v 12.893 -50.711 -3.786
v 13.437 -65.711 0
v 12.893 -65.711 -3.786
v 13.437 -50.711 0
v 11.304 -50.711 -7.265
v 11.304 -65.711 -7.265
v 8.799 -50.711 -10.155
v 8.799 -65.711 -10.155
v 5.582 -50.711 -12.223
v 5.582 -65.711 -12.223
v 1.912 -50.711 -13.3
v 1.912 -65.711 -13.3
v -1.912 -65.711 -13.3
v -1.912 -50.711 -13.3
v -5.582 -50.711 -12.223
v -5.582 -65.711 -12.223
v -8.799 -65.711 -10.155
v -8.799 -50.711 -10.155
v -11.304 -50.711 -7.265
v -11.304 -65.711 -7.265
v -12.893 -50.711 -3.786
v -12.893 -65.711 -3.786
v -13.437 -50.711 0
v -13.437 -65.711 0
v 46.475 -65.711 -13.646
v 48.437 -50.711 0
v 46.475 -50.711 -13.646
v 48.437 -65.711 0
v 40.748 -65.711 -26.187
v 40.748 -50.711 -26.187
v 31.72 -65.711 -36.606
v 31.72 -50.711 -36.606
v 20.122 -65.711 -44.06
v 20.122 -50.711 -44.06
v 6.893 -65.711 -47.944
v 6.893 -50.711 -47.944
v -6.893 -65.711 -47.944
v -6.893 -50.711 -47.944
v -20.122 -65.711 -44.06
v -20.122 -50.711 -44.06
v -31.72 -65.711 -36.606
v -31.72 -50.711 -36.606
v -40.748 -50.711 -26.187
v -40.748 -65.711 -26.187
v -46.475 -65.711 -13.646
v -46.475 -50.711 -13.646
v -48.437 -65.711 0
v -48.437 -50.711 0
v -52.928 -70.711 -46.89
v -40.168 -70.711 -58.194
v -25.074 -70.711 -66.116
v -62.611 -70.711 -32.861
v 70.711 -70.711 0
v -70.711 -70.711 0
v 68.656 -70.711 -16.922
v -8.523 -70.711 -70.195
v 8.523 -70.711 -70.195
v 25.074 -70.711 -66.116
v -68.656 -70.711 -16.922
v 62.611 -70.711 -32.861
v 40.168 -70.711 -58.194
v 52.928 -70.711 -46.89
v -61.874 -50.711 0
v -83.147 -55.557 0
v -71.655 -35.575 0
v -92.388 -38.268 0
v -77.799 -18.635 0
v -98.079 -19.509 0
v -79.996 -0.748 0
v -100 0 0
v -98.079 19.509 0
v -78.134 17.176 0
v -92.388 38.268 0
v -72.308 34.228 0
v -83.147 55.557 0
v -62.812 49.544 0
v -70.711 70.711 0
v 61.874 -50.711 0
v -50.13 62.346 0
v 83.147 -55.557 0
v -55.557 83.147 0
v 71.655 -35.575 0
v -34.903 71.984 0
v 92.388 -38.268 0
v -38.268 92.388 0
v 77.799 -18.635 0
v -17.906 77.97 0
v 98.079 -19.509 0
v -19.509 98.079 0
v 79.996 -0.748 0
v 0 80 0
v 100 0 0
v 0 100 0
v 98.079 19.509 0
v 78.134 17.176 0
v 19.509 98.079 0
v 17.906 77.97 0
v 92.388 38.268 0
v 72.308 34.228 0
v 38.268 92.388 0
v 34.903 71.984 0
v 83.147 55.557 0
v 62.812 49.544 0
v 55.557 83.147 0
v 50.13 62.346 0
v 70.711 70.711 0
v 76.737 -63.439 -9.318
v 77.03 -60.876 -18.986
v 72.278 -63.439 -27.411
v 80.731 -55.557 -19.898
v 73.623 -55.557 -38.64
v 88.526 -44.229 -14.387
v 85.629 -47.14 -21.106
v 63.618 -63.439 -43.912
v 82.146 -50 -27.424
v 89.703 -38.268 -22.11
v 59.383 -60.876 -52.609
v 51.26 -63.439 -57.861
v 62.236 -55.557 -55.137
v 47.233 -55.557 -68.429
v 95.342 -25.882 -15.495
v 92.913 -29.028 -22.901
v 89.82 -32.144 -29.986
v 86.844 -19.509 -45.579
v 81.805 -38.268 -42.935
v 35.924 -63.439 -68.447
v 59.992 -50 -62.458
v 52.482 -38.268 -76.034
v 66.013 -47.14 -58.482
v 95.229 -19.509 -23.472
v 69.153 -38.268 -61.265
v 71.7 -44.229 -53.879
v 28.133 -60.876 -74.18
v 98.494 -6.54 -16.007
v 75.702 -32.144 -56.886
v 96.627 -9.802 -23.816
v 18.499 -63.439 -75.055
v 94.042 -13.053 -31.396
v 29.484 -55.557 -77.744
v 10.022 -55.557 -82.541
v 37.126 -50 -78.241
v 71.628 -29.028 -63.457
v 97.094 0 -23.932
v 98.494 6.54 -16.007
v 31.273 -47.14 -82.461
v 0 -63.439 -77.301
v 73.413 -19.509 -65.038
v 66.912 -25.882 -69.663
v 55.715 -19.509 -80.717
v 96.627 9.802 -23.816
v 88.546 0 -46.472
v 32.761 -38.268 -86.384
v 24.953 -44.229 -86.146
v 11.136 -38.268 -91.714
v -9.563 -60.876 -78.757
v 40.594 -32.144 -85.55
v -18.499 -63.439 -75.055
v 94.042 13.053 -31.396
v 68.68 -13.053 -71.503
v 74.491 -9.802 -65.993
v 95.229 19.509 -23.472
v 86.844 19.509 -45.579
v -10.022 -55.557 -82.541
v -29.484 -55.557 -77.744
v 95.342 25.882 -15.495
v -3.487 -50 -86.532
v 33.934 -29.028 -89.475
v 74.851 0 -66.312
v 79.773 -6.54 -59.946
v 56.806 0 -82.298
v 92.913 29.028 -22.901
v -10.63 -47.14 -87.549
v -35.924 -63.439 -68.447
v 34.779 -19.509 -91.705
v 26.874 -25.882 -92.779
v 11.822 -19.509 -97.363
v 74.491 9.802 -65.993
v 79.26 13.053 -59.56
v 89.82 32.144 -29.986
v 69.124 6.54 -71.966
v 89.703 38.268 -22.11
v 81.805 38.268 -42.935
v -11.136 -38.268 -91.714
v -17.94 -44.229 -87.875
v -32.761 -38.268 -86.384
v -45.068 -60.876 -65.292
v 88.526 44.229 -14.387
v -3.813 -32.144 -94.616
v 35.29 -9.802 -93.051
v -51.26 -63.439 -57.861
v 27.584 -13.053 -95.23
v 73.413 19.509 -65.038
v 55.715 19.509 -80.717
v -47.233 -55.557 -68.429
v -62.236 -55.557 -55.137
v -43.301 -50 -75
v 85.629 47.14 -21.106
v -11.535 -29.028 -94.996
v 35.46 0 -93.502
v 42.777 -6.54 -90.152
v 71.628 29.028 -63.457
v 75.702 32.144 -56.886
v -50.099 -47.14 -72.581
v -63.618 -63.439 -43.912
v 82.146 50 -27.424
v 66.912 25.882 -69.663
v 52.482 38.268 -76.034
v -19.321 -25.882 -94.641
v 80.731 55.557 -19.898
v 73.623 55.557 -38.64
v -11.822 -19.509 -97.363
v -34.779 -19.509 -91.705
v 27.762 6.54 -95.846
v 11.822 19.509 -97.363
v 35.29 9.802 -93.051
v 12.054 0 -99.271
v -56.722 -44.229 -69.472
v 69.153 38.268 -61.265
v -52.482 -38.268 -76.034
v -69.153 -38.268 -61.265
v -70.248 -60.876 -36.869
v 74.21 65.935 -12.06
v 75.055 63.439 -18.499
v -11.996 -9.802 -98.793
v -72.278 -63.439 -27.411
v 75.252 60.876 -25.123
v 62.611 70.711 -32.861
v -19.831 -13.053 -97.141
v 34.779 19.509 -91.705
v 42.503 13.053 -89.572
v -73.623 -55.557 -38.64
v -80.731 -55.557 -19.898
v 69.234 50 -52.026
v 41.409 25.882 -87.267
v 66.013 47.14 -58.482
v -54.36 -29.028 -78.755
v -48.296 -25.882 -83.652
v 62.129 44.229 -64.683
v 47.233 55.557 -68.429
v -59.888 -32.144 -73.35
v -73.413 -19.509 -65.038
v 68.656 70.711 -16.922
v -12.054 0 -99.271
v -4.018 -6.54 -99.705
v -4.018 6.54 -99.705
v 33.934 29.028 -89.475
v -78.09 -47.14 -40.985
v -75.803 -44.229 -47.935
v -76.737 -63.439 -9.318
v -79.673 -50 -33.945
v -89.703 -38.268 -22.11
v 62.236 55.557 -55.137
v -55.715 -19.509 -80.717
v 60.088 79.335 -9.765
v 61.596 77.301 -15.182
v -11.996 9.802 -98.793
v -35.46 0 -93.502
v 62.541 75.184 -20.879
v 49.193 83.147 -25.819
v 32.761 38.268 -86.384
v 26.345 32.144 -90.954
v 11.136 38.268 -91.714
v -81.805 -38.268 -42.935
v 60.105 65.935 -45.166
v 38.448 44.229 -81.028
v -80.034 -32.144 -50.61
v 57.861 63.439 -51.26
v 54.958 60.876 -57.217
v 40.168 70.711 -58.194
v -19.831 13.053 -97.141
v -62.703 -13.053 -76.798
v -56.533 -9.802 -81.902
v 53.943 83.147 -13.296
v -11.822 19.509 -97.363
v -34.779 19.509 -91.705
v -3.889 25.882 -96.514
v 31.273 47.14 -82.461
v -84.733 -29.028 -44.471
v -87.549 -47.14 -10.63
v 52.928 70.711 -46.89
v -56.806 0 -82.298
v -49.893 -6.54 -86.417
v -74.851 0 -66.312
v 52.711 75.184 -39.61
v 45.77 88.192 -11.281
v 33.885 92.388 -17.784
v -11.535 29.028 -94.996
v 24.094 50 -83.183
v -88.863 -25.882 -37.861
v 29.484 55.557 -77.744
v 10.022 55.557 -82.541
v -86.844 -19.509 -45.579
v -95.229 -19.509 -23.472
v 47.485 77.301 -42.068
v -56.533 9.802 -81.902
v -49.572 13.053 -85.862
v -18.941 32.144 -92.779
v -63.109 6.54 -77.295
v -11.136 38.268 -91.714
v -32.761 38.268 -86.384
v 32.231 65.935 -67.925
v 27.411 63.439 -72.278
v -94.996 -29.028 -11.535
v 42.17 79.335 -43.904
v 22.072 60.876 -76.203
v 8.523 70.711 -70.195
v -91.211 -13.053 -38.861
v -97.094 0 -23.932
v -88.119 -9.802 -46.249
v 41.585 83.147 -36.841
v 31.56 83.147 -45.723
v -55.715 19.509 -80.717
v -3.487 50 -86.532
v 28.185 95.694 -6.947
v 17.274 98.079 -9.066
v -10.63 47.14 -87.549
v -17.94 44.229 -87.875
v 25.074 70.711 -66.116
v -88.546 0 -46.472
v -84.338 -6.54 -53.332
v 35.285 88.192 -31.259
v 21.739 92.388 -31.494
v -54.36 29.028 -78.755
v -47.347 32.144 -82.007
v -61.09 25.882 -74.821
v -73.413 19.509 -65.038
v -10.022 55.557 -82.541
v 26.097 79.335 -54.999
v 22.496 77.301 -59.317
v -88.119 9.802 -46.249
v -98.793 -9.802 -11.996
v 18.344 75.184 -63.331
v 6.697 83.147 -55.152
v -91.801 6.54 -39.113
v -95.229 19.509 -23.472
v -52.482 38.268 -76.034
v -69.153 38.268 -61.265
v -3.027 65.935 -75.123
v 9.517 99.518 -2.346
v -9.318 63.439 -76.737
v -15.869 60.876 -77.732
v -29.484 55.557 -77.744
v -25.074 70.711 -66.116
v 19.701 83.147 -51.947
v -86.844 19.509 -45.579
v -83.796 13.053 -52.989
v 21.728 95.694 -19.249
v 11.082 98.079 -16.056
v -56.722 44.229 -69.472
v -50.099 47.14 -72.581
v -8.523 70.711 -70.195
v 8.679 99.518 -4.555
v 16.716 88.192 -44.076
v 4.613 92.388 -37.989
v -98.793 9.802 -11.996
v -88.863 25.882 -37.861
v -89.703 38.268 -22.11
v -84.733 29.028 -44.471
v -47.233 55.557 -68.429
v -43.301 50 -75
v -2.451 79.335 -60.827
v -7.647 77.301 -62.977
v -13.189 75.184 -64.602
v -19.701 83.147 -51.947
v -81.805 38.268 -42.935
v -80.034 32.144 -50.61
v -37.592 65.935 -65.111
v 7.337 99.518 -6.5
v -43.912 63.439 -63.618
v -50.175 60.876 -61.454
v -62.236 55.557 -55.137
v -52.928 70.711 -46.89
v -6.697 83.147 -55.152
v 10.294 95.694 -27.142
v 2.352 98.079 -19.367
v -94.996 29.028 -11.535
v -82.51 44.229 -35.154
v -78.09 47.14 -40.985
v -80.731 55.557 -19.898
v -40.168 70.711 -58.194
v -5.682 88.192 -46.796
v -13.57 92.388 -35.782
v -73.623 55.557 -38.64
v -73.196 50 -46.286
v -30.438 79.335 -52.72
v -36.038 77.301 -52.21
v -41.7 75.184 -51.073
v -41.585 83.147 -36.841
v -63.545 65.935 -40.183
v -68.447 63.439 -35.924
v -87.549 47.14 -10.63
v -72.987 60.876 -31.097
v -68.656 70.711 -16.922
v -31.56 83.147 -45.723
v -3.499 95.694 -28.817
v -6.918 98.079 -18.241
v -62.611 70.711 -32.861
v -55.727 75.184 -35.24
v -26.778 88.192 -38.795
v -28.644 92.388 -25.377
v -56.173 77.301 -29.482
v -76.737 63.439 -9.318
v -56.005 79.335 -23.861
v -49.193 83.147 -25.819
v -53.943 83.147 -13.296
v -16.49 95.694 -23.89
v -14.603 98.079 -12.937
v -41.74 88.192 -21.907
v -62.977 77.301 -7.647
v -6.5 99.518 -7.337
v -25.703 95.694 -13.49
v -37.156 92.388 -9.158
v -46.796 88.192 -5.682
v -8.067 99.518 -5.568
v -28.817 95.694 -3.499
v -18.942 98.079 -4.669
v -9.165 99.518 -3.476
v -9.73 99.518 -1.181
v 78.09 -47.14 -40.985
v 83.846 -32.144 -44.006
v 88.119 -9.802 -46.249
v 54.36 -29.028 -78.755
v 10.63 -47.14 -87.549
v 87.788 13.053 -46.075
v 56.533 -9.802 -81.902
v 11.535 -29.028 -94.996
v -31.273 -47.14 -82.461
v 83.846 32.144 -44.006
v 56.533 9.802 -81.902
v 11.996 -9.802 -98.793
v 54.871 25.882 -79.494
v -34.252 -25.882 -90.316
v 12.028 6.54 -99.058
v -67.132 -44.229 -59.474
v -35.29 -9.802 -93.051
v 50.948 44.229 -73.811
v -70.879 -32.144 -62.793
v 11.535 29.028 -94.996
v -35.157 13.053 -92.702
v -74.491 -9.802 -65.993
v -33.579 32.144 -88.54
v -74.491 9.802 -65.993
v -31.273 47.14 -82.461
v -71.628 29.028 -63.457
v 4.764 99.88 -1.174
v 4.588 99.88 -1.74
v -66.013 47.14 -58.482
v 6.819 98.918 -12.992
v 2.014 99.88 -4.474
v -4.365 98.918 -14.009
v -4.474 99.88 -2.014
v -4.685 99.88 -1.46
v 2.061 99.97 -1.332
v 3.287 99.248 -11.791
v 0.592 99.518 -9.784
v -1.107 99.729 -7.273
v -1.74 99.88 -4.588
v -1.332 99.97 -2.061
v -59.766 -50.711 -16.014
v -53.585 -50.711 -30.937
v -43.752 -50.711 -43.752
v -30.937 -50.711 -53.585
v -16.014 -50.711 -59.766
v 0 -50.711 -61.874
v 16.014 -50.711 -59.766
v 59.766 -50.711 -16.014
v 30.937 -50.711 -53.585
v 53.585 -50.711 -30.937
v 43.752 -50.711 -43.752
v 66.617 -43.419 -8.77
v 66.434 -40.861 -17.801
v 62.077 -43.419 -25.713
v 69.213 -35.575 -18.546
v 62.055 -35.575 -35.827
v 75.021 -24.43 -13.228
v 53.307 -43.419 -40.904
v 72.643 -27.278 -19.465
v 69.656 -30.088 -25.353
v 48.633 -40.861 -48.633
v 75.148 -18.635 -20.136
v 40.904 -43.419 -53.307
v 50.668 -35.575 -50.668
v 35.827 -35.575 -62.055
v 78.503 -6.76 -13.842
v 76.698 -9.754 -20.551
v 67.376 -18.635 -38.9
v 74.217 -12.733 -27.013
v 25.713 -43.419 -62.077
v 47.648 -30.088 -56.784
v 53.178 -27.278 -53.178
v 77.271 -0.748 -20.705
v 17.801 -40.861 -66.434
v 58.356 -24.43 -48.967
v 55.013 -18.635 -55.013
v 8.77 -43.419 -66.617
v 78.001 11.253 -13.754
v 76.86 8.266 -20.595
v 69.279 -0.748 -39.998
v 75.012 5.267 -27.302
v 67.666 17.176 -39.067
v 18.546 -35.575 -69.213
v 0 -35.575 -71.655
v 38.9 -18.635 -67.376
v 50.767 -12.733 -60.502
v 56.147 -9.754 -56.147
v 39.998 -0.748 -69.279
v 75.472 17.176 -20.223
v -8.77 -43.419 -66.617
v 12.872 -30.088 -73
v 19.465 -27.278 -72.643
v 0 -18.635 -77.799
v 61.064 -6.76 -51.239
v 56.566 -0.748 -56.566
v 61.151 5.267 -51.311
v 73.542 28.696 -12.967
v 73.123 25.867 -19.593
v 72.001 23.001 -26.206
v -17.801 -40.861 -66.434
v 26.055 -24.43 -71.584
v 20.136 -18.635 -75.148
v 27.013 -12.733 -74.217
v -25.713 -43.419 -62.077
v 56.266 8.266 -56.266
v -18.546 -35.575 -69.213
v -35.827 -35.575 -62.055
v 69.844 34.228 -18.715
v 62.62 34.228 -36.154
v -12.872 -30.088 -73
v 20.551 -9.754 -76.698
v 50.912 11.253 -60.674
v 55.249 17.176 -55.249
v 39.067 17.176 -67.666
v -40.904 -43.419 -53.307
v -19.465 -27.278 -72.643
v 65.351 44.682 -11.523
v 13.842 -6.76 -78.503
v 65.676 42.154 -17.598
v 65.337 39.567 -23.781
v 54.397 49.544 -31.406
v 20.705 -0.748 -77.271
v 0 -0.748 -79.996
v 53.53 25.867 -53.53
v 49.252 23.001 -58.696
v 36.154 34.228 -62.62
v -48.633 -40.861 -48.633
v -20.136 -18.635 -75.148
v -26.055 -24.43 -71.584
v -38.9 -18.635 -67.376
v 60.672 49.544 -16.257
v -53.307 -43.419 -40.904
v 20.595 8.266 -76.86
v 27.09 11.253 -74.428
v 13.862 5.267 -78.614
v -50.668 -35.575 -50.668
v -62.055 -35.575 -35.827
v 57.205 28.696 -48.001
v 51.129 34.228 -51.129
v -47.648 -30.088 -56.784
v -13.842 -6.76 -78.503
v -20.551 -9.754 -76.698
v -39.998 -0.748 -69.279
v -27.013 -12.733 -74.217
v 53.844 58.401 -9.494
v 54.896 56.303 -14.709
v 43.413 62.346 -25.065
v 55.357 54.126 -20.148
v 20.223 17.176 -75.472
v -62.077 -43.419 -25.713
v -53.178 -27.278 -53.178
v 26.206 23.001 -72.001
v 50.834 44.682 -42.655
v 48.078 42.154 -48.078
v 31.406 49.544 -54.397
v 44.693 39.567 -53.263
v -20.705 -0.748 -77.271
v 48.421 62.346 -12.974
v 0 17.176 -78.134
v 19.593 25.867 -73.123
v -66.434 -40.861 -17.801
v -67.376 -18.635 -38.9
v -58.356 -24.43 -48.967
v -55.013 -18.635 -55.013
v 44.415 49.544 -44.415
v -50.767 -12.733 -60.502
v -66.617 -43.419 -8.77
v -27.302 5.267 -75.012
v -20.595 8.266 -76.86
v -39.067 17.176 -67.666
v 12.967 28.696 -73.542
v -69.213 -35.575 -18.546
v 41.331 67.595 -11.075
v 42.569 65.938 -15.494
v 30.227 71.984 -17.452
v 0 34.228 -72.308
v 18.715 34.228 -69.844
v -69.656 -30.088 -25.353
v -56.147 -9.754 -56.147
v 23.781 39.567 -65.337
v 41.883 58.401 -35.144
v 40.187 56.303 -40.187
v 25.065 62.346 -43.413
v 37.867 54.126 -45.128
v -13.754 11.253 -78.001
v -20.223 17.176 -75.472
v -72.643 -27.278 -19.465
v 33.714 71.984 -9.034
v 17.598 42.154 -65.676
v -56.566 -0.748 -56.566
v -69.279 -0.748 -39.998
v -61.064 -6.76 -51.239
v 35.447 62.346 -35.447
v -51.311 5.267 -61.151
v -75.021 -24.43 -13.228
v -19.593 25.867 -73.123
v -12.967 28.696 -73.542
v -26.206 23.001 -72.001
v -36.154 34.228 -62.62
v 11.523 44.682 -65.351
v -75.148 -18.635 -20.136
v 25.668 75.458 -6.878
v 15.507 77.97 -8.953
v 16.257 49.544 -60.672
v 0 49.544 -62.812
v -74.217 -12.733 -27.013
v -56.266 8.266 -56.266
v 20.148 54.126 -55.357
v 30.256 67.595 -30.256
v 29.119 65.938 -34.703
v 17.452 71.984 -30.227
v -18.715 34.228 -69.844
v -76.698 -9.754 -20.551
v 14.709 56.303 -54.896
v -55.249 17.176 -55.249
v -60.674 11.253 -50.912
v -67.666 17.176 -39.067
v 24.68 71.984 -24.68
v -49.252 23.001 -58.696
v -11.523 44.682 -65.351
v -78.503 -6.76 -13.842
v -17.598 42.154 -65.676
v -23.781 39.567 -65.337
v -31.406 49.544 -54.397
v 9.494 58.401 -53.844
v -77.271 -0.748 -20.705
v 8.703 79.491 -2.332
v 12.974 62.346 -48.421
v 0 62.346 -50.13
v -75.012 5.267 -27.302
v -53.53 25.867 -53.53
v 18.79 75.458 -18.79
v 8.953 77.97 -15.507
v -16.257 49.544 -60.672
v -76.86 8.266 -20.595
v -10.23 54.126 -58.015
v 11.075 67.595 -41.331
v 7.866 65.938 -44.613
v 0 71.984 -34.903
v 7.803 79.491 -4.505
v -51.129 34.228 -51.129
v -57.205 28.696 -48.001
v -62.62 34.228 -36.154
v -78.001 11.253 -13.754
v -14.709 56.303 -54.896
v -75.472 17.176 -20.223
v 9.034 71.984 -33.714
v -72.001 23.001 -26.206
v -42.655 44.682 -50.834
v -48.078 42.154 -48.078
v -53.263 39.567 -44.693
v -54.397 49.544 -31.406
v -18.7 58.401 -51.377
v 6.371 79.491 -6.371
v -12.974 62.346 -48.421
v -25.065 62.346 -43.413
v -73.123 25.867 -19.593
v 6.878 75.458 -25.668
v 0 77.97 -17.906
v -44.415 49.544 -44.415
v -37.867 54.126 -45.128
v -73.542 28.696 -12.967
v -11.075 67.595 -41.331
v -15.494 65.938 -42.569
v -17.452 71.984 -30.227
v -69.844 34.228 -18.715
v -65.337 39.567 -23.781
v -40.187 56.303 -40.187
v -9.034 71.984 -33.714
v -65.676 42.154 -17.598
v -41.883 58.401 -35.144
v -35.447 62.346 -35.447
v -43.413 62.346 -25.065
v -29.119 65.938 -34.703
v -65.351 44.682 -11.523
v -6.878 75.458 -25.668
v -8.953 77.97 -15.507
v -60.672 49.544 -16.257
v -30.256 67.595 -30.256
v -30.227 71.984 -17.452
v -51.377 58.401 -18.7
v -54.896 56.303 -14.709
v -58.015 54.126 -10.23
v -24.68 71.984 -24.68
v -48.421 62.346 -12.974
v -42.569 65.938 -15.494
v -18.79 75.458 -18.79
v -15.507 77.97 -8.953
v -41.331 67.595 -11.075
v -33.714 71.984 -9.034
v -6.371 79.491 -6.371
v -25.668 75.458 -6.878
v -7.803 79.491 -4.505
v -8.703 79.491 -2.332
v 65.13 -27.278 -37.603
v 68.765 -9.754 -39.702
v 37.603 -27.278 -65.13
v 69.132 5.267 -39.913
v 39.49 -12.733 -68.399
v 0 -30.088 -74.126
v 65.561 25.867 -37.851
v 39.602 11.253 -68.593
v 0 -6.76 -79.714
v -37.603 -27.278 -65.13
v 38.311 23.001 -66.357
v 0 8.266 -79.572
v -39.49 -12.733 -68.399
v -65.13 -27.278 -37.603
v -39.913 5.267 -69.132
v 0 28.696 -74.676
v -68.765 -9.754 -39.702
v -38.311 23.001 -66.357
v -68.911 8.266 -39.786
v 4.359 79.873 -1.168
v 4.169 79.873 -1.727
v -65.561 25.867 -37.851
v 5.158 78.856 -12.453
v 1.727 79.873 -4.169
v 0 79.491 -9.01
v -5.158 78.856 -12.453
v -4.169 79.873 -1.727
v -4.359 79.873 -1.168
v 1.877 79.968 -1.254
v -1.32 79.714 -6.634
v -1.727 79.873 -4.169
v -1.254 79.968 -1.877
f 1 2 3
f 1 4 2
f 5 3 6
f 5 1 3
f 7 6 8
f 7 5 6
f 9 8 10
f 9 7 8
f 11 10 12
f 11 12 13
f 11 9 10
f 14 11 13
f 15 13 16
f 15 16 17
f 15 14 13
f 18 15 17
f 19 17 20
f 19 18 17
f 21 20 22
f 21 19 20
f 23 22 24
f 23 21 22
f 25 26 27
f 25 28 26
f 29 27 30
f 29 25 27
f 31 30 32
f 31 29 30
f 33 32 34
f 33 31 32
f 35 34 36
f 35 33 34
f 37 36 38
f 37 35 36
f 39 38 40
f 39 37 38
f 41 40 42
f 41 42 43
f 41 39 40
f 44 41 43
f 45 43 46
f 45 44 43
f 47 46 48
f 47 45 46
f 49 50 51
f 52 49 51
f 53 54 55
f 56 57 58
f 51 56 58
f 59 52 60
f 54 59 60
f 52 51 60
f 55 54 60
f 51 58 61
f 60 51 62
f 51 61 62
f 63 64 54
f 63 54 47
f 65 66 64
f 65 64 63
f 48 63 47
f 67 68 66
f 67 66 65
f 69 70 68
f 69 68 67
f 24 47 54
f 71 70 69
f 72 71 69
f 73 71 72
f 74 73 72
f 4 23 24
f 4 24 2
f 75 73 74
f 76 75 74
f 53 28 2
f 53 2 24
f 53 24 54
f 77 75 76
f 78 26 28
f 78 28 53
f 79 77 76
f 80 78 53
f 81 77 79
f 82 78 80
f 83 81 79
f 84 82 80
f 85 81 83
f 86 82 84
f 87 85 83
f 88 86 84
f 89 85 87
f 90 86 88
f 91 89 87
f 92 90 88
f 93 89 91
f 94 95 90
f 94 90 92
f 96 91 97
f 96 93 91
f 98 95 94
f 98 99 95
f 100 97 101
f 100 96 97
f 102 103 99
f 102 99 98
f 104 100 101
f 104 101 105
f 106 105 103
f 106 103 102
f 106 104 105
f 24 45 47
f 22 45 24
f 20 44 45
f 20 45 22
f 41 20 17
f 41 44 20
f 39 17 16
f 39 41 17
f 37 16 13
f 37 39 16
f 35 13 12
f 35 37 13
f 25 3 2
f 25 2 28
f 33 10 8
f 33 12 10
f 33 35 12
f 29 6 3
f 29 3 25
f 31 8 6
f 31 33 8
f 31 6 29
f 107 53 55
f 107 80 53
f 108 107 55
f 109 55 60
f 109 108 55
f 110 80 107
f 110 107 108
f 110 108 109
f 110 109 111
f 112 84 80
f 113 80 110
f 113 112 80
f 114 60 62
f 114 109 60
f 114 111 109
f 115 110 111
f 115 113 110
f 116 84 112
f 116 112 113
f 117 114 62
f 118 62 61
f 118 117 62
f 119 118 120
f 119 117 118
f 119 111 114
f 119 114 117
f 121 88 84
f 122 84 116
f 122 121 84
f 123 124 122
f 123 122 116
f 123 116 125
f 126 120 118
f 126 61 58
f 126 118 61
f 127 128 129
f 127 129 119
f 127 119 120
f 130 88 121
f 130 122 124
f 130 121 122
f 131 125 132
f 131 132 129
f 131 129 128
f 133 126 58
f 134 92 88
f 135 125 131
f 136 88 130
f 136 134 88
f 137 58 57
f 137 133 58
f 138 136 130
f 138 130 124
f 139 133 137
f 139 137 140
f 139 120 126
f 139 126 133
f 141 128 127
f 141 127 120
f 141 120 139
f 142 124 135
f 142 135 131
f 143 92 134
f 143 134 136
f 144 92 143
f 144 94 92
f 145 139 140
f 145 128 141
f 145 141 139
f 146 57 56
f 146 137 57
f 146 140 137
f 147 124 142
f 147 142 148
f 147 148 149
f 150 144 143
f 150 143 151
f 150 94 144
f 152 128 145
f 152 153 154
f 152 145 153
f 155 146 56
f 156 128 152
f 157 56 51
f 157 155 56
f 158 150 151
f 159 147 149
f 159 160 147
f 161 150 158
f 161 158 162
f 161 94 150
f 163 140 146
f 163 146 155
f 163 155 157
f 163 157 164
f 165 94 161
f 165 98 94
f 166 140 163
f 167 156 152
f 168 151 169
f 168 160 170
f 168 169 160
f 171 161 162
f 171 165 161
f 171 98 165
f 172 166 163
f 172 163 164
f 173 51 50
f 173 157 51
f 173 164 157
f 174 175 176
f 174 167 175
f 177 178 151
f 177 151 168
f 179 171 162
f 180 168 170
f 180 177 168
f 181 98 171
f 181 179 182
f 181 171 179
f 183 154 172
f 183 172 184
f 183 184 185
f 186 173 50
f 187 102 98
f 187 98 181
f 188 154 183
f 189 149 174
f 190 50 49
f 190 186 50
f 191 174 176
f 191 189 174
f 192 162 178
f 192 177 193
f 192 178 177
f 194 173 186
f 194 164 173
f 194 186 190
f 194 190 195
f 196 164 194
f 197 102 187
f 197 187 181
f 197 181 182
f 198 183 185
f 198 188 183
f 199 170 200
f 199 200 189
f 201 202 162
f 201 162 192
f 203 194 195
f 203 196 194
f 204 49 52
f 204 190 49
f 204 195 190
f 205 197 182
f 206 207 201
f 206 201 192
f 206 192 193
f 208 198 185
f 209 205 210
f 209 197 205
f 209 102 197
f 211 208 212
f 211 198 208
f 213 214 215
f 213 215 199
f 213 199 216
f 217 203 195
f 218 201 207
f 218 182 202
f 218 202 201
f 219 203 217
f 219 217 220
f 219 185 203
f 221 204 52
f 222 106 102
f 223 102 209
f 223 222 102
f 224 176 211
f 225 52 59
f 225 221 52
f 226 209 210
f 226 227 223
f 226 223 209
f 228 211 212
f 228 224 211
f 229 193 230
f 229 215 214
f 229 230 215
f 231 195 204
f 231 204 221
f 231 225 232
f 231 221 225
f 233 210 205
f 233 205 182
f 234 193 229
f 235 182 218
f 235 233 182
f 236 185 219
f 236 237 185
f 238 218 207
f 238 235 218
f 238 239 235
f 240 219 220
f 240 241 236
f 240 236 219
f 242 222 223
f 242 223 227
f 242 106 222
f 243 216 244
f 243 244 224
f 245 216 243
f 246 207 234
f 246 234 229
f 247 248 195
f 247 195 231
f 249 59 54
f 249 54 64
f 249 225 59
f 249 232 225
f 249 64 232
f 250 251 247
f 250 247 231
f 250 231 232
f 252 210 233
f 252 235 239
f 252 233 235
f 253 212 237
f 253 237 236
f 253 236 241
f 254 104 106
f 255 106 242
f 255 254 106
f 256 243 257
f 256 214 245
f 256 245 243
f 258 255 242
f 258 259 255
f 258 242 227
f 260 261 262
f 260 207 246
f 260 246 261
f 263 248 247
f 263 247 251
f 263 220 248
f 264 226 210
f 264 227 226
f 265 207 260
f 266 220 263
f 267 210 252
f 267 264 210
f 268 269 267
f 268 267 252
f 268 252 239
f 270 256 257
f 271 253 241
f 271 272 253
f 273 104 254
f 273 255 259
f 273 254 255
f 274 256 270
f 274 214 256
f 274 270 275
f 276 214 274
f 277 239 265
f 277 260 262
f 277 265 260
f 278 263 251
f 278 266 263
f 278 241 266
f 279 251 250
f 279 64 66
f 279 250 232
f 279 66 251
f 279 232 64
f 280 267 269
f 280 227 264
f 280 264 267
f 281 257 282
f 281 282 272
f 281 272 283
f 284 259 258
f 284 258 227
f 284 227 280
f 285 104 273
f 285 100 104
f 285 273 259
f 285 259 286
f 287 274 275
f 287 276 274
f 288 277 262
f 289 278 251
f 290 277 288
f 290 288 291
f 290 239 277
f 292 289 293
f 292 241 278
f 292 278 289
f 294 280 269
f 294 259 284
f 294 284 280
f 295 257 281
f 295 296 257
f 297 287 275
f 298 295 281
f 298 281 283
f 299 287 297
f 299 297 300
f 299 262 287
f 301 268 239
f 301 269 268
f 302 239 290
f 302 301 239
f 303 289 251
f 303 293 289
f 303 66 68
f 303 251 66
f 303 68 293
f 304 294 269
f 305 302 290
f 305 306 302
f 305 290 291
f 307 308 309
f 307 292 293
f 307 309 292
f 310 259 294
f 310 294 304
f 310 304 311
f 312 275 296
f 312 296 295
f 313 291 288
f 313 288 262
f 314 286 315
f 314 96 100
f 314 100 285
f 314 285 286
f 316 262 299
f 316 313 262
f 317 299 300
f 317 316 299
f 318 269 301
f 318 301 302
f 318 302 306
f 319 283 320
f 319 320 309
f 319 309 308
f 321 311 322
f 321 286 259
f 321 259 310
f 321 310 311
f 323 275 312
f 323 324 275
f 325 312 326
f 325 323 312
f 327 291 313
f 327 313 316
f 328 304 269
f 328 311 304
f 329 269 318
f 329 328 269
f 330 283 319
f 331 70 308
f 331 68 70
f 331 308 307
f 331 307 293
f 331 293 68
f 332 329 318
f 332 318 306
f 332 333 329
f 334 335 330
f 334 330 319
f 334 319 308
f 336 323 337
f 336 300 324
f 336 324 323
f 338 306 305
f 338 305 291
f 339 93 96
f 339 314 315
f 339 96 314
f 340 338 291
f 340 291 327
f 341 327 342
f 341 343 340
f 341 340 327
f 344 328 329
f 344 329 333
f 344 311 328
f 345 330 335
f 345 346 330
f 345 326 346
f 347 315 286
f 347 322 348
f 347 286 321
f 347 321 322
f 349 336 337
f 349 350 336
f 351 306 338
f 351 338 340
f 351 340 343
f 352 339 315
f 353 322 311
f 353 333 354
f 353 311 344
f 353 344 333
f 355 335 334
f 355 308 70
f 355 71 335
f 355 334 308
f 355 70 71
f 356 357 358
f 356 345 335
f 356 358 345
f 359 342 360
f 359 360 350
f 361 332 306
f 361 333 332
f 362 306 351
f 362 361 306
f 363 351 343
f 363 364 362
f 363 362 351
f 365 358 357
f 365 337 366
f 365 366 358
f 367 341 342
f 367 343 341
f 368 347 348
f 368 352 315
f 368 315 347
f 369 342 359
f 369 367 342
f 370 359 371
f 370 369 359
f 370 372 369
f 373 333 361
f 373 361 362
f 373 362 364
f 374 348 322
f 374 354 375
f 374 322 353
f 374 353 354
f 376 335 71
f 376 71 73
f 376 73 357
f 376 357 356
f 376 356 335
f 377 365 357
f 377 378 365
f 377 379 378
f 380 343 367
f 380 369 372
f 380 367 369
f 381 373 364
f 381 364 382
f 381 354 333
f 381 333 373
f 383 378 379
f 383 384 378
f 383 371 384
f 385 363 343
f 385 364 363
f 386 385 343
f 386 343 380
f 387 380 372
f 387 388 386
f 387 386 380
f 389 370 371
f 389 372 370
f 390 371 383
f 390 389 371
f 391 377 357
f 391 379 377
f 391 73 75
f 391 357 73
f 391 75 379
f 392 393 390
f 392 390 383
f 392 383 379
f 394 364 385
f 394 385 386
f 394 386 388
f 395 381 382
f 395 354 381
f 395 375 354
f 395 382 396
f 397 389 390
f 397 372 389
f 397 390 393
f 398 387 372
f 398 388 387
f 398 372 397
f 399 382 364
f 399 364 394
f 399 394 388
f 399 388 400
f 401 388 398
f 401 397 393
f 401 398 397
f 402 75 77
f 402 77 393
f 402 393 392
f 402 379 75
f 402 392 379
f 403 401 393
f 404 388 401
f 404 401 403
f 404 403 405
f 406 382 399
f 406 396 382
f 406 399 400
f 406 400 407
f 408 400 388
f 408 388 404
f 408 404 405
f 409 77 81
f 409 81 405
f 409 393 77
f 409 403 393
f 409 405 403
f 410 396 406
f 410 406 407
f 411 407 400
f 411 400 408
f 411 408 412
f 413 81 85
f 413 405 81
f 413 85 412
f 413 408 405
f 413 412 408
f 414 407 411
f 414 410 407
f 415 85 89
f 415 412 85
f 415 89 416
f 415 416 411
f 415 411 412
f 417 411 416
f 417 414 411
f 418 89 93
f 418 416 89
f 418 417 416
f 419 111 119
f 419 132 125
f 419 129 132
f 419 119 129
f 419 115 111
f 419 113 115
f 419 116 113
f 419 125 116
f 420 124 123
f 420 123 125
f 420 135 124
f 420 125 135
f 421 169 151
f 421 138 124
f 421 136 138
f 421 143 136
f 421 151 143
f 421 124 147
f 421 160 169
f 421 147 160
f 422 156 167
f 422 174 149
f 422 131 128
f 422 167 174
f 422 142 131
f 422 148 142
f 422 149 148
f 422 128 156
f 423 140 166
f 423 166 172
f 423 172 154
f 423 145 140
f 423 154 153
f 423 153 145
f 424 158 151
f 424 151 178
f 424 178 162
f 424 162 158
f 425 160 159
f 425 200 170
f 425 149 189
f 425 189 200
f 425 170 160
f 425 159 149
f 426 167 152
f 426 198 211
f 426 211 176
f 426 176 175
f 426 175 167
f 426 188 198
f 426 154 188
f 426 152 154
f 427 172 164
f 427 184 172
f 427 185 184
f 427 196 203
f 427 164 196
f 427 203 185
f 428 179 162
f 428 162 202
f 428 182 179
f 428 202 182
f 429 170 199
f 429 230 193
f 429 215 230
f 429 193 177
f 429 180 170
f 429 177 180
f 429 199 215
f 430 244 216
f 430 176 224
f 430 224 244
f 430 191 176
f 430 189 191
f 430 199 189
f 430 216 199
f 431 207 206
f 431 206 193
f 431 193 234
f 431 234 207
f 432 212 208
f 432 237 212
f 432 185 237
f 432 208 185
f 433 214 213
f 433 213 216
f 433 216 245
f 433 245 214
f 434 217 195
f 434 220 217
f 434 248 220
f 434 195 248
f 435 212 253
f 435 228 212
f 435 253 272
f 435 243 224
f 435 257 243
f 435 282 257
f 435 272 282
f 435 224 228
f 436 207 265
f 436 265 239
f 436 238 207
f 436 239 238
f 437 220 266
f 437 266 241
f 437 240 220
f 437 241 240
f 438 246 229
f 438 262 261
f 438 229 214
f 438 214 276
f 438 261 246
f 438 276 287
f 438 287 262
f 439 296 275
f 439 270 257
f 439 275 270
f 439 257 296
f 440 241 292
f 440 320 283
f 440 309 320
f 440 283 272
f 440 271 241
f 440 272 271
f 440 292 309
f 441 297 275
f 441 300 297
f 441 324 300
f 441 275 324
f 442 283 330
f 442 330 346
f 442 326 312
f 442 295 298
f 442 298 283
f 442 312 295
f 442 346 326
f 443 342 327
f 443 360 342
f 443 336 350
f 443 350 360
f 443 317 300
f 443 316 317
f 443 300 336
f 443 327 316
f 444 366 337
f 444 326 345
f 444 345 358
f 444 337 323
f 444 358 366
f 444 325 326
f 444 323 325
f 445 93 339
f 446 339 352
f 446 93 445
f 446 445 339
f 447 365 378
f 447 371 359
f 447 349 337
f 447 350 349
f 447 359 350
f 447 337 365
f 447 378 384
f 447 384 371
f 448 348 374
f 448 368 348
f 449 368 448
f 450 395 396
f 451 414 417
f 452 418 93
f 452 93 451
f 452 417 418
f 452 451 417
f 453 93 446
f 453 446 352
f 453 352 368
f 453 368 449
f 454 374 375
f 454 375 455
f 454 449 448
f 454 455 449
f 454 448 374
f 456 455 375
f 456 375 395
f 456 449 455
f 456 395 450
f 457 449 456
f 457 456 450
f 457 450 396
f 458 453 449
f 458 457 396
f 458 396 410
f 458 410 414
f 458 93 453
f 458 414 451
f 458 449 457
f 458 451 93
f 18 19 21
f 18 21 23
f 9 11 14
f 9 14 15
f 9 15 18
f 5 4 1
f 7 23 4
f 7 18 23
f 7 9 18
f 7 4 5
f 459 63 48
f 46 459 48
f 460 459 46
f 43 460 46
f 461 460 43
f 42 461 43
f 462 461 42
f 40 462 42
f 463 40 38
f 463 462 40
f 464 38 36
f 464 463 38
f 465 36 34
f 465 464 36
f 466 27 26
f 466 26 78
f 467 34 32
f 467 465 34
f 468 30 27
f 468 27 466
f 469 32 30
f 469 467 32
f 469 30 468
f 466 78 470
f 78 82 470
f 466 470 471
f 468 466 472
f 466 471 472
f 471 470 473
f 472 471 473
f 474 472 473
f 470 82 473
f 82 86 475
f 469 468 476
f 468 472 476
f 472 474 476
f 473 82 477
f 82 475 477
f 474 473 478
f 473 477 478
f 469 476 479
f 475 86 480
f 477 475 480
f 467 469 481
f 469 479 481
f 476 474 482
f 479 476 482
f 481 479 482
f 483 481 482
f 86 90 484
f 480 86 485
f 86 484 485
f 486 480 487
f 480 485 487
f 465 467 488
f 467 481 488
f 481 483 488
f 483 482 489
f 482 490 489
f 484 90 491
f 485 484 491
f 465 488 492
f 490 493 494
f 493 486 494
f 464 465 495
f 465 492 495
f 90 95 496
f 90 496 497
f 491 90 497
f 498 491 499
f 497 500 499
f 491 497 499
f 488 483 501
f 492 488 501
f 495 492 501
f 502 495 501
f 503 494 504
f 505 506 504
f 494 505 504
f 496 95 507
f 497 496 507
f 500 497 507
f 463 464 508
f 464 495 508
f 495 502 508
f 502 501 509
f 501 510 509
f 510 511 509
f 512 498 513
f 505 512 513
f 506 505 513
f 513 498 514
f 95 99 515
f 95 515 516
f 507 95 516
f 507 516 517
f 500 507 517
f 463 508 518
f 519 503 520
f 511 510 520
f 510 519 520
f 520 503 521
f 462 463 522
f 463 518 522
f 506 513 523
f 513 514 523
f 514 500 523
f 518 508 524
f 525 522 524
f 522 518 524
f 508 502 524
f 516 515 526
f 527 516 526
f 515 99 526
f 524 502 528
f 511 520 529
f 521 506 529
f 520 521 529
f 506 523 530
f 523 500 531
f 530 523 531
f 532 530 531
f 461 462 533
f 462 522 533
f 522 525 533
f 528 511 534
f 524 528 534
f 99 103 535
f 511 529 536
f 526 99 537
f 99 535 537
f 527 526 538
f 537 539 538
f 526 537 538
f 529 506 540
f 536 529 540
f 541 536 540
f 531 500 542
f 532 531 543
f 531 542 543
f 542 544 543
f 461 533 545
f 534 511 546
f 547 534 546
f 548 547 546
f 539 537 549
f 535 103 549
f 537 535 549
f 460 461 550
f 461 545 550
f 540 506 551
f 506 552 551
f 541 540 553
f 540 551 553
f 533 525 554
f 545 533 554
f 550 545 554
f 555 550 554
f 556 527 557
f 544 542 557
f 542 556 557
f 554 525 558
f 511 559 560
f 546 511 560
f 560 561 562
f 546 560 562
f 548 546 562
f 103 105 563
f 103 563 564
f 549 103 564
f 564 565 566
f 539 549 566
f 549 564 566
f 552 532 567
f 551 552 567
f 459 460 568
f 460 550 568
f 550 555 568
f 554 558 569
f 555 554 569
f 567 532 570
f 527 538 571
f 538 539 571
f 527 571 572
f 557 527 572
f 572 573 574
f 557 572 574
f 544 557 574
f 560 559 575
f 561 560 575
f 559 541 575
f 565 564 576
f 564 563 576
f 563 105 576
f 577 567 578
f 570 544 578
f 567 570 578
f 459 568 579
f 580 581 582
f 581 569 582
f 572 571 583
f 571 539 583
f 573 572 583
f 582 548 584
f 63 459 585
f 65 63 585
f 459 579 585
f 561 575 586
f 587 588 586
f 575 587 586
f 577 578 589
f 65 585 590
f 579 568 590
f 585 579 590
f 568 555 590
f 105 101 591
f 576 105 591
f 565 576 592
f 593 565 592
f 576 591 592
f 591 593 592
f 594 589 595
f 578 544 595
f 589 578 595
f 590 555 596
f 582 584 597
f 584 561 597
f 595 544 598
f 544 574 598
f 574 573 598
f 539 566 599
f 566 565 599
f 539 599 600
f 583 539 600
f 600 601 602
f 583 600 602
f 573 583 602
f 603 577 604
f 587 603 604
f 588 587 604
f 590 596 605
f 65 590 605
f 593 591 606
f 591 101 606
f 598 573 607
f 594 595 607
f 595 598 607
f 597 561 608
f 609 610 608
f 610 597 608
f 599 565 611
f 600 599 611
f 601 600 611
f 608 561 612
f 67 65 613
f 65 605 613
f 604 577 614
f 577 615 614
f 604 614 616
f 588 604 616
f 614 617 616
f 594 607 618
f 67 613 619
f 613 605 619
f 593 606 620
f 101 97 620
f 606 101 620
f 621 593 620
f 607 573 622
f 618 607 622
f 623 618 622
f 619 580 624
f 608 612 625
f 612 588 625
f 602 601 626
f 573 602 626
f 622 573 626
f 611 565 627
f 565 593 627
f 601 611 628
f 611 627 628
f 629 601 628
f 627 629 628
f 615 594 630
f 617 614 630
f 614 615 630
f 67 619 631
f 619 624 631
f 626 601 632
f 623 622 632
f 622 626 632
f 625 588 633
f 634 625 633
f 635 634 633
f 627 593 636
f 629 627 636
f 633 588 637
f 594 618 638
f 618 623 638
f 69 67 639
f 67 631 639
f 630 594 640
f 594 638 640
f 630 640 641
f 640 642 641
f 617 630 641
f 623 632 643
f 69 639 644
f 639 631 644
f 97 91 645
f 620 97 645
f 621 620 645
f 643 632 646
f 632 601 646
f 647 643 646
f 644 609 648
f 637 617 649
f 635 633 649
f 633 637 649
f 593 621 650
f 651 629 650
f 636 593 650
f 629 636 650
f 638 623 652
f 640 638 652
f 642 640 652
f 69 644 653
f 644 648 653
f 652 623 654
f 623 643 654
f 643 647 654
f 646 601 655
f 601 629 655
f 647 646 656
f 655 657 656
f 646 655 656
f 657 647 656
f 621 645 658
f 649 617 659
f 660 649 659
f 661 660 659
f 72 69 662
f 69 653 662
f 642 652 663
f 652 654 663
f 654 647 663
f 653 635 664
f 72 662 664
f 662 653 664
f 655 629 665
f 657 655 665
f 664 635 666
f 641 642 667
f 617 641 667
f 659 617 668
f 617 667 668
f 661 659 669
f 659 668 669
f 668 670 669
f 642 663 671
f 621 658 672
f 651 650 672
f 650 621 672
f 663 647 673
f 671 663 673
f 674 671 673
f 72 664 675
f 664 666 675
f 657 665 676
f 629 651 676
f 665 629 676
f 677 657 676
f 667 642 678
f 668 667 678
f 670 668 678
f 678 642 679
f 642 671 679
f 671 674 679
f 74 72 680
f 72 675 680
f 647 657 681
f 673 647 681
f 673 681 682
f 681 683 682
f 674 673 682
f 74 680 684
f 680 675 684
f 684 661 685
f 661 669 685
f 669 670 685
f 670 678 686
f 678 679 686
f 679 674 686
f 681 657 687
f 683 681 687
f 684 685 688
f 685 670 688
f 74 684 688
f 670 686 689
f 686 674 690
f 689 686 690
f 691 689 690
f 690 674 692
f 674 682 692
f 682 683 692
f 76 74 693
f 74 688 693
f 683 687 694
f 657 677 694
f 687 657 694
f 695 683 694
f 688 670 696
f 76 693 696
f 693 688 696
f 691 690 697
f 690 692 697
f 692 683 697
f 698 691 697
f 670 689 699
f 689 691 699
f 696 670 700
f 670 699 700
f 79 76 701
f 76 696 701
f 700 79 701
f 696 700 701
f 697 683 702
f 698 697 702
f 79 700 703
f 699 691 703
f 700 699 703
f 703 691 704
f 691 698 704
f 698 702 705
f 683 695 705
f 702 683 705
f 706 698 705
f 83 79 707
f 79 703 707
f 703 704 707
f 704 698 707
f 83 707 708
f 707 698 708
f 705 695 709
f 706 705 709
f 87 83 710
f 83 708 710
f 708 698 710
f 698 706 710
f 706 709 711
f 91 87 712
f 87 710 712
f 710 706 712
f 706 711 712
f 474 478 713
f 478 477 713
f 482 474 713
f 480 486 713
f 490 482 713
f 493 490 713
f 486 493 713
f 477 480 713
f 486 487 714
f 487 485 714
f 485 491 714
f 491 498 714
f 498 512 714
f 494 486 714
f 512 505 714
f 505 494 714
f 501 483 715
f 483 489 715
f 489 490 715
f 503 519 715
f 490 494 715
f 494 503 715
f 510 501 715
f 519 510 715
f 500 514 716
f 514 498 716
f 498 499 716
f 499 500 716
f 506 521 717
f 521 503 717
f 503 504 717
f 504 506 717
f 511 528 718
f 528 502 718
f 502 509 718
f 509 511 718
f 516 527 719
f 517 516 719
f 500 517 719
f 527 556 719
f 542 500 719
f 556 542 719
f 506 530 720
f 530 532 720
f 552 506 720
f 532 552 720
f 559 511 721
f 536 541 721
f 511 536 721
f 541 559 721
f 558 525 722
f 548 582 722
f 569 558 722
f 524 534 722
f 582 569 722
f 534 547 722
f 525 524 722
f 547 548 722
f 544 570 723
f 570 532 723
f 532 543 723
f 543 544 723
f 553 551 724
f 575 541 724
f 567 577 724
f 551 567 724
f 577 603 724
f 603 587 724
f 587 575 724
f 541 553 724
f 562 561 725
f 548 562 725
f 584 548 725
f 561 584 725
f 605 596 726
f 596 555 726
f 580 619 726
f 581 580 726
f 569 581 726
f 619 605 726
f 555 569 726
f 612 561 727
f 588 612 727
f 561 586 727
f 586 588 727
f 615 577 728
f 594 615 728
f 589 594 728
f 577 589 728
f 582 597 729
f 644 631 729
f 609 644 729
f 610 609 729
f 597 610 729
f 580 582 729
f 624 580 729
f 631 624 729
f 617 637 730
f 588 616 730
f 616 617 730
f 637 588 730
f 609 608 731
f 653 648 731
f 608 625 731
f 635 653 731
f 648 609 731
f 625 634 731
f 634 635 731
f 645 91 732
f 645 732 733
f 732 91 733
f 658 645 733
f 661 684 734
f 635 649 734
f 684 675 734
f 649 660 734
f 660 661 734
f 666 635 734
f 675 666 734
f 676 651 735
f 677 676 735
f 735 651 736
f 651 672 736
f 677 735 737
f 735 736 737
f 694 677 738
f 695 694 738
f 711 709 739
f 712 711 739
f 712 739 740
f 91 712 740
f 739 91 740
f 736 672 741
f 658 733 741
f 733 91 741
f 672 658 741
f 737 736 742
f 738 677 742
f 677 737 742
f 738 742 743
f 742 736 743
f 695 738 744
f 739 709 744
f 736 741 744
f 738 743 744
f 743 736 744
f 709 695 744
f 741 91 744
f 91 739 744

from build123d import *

# Parameters (mm, degrees)
REVOLUTION_ANGLE = 180


with BuildPart() as part:
    # Sketch → Revolution (revolve)
    with BuildSketch(Plane.XY):
        with BuildLine():
            ThreePointArc((70.710678, -70.710678), (92.387953, 38.268343), (0, 100))
            Line((0, 100), (0, 80))
            ThreePointArc((61.874285, -50.710678), (72.307864, 34.228247), (0, 80))
            Line((61.874285, -50.710678), (48.437142, -50.710678))
            Line((48.437142, -50.710678), (48.437142, -65.710678))
            Line((48.437142, -65.710678), (13.437142, -65.710678))
            Line((13.437142, -65.710678), (13.437142, -50.710678))
            Line((13.437142, -50.710678), (0, -50.710678))
            Line((0, -50.710678), (0, -70.710678))
            Line((70.710678, -70.710678), (0, -70.710678))
        make_face()
    revolve(axis=Axis((0, 0, 0), (0, 1, 0)), revolution_arc=REVOLUTION_ANGLE)


solid = part.part
